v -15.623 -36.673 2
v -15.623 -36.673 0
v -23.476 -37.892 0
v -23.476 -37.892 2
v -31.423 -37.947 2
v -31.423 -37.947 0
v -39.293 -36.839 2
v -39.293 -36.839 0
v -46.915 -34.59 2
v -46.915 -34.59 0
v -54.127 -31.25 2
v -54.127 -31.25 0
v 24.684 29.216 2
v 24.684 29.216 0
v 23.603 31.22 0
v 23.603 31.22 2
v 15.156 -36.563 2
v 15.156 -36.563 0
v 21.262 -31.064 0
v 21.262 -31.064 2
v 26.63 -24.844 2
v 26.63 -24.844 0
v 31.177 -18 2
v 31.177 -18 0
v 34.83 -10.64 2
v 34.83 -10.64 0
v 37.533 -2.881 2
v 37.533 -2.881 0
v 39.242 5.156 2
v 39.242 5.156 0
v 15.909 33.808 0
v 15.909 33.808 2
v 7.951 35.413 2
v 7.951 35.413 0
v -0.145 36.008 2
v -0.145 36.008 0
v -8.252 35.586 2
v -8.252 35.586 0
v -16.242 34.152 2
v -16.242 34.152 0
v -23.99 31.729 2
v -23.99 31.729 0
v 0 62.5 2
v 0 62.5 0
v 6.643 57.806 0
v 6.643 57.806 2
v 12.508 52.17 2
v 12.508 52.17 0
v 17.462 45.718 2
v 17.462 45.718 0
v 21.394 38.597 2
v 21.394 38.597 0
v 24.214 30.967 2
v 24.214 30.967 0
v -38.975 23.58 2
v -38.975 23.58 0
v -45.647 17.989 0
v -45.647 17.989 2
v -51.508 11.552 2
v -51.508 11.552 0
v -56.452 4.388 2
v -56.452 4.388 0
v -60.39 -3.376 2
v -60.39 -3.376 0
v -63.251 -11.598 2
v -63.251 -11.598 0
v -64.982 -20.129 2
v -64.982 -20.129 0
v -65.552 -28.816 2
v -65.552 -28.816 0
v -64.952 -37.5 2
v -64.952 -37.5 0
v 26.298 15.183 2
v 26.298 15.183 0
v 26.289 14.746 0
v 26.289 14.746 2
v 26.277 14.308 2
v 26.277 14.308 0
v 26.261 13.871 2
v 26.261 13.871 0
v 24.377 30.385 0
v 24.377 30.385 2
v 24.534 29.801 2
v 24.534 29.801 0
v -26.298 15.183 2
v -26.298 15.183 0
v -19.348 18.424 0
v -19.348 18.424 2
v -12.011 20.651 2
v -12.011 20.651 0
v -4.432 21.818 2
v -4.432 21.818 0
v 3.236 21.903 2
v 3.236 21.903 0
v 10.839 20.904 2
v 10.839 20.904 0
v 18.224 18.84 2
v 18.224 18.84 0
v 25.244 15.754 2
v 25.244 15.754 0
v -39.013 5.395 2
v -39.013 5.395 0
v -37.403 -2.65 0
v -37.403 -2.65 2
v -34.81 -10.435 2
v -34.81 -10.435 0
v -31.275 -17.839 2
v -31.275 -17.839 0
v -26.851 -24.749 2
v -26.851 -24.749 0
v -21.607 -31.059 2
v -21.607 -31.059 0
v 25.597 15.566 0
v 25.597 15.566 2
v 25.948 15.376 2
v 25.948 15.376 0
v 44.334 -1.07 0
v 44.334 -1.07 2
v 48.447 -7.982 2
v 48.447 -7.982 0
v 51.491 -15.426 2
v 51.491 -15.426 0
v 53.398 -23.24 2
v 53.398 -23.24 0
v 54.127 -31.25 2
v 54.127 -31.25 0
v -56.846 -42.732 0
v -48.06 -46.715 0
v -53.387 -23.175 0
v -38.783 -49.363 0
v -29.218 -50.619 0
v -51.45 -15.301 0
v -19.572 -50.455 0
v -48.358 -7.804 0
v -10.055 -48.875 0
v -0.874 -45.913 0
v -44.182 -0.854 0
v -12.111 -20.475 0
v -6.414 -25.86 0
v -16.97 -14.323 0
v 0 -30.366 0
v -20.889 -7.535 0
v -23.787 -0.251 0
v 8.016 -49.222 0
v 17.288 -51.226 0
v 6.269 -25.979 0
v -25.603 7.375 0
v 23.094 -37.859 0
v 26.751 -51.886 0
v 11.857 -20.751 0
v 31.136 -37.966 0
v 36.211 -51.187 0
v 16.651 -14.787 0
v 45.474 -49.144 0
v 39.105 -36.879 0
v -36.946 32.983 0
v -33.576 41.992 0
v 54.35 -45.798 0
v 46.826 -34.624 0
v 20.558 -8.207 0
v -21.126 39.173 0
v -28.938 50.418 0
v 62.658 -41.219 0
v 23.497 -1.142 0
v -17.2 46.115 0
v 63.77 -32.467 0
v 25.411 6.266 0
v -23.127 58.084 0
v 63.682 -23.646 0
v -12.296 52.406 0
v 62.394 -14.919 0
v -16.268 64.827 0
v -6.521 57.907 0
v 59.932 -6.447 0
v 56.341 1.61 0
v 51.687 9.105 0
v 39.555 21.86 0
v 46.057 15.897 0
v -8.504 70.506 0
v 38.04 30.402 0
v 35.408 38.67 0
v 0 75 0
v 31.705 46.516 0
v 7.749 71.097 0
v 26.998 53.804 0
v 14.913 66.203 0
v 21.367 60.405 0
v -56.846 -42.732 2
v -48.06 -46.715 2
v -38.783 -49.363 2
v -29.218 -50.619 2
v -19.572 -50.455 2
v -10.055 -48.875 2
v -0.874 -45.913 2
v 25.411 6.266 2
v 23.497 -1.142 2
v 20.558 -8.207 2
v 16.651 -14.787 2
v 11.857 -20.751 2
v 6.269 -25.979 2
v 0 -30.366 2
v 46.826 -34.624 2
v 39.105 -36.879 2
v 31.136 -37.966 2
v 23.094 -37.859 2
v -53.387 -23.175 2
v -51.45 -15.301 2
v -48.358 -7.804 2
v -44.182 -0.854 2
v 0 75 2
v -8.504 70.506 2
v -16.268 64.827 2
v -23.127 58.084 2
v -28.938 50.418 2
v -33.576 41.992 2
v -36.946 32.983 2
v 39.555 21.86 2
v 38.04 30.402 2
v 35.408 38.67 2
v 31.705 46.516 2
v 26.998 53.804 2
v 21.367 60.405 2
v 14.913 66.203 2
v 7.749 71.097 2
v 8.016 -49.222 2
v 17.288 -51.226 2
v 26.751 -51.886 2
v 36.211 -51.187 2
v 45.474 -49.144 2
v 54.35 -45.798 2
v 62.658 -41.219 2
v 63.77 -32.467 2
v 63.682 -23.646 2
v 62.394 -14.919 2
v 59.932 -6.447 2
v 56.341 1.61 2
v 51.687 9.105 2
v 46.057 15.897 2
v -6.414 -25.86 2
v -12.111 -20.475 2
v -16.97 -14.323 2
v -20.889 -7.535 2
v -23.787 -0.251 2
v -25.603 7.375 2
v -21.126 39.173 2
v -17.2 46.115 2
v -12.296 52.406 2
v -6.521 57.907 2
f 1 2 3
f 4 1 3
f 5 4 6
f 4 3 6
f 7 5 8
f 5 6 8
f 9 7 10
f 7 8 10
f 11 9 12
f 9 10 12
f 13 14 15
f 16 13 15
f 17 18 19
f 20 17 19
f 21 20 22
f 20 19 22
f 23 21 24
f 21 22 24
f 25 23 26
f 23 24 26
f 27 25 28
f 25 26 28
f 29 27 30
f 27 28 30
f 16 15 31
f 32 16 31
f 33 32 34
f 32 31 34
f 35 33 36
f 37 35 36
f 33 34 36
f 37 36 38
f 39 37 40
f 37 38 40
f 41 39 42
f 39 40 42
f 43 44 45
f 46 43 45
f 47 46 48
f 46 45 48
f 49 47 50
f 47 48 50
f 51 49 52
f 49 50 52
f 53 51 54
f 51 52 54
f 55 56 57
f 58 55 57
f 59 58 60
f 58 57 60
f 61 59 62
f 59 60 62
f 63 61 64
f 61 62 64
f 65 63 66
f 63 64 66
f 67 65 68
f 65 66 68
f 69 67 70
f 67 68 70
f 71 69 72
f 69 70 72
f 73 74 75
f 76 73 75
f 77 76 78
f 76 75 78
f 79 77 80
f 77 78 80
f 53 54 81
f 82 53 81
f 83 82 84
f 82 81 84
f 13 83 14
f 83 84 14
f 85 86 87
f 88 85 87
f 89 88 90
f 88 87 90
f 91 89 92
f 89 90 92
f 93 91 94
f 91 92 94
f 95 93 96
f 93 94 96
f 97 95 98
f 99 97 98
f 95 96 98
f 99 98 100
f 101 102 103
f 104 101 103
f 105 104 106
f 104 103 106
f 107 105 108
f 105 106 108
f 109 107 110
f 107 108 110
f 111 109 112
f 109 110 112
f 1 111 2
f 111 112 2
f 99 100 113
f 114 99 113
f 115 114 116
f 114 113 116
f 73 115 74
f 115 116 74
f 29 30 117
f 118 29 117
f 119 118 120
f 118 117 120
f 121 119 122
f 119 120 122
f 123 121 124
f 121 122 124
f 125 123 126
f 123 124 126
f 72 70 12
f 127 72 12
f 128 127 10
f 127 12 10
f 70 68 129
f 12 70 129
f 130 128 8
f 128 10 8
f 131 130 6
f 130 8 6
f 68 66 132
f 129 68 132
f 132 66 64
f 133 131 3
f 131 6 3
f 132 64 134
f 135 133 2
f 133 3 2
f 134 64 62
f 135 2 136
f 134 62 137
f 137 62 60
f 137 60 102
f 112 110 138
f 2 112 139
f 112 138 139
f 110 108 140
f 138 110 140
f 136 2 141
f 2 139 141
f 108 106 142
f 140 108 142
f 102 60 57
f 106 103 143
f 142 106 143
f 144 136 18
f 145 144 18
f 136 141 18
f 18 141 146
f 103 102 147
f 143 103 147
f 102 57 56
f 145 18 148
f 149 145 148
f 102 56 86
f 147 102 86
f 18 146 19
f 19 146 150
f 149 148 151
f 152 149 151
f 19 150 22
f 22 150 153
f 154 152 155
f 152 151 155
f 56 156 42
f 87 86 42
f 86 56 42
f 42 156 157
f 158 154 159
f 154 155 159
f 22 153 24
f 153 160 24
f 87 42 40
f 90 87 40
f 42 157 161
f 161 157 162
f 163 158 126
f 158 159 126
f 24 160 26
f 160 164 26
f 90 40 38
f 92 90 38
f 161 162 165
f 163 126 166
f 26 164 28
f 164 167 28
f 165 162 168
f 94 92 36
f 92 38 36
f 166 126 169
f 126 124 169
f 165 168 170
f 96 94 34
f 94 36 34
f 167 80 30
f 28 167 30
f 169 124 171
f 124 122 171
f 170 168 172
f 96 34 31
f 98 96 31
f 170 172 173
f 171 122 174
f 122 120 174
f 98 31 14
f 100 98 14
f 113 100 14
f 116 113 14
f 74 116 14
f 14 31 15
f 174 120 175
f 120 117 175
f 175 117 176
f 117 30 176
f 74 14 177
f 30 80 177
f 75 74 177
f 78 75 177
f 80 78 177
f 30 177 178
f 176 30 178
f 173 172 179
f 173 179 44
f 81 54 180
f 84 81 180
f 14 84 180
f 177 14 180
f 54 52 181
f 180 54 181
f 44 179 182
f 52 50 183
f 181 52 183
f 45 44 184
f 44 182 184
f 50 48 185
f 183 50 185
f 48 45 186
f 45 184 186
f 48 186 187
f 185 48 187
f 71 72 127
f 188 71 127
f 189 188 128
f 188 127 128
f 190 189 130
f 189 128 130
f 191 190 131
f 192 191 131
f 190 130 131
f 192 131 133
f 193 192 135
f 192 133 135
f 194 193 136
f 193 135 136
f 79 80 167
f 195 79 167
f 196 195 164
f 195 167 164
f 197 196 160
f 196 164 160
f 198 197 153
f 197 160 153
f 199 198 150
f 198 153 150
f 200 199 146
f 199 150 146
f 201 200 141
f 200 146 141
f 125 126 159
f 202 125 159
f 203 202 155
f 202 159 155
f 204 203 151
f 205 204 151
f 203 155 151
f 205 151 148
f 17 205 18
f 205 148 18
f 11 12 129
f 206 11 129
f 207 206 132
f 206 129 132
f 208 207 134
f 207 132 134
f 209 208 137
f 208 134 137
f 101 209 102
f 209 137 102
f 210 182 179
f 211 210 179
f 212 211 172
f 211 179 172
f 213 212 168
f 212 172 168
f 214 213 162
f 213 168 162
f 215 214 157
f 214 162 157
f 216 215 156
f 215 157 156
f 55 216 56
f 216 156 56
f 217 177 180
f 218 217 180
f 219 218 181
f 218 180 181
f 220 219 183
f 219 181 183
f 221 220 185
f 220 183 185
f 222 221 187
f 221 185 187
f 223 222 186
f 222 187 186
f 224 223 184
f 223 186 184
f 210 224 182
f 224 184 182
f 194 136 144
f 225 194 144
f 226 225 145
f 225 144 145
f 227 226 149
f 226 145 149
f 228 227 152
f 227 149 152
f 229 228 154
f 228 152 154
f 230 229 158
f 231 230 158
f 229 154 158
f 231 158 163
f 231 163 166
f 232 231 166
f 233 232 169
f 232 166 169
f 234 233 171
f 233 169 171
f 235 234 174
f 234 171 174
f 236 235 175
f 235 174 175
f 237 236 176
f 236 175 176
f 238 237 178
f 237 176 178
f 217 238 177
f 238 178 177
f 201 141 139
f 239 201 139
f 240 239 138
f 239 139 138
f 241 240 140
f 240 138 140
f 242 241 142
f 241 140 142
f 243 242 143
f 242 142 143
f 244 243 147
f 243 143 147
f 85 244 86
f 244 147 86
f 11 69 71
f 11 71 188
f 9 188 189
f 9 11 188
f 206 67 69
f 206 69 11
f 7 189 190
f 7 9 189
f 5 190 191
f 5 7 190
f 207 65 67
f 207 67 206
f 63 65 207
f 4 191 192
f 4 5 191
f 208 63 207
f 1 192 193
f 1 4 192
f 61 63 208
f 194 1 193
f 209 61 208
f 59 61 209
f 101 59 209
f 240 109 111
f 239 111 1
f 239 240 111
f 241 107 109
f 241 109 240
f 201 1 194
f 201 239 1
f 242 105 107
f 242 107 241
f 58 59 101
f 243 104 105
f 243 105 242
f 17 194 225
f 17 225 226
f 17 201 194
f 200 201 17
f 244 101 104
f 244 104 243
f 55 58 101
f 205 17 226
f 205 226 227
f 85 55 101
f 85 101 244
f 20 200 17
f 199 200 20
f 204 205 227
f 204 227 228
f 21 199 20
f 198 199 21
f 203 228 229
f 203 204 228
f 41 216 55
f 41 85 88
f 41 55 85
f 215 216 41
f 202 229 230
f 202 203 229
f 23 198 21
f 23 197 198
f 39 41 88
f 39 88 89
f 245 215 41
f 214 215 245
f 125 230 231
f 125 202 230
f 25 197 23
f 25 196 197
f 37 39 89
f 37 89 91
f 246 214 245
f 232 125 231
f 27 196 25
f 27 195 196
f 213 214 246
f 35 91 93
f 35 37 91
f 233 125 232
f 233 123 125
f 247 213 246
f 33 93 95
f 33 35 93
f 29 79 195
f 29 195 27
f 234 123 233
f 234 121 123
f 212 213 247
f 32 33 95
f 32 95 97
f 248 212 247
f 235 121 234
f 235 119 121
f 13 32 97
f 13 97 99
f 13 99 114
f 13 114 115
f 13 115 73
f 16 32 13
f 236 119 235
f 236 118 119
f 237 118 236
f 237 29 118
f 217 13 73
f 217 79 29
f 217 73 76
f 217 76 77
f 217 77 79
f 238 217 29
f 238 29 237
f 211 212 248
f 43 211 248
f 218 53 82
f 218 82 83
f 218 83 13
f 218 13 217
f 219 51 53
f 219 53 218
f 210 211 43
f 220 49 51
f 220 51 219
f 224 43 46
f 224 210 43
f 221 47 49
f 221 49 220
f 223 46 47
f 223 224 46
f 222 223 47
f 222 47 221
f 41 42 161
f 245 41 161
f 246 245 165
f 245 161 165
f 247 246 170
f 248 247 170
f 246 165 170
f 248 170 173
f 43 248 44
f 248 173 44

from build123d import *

# Parameters (mm, degrees)
F1_DEPTH = 2


with BuildPart() as f1:
    # F0 (on Top) → F1 (new body)
    with BuildSketch(Plane.XY):
        with BuildLine():
            ThreePointArc((-38.974674, 23.580405), (-60.390278, -3.375836), (-64.951905, -37.5))
            ThreePointArc((-64.951905, -37.5), (-34.023862, -50.167524), (-0.874012, -45.913403))
            ThreePointArc((-0.874012, -45.913403), (-8.553201, -41.779684), (-15.62271, -36.672862))
            ThreePointArc((-15.62271, -36.672862), (-35.378352, -37.537867), (-54.126588, -31.25))
            ThreePointArc((-54.126588, -31.25), (-50.044813, -11.494391), (-39.013473, 5.395087))
            ThreePointArc((-39.013473, 5.395087), (-33.020374, 10.762858), (-26.297898, 15.183099))
            ThreePointArc((-26.297898, 15.183099), (-0.599358, 21.996682), (25.243749, 15.753792))
            ThreePointArc((25.243749, 15.753792), (25.772403, 15.471363), (26.297898, 15.183099))
            ThreePointArc((26.297898, 15.183099), (25.95057, 22.252358), (24.683909, 29.21588))
            Line((24.683909, 29.21588), (23.603483, 31.219872))
            ThreePointArc((23.603483, 31.219872), (-0.144813, 36.00849), (-23.990038, 31.728577))
            ThreePointArc((-23.990038, 31.728577), (-31.751976, 28.150327), (-38.974674, 23.580405))
        make_face()
        with BuildLine():
            ThreePointArc((39.555322, 21.859627), (26.997523, 53.803957), (0, 75))
            ThreePointArc((0, 75), (-26.171862, 54.356893), (-38.974674, 23.580405))
            ThreePointArc((-38.974674, 23.580405), (-31.751976, 28.150327), (-23.990038, 31.728577))
            ThreePointArc((-23.990038, 31.728577), (-14.863791, 49.350843), (0, 62.5))
            ThreePointArc((0, 62.5), (15.106633, 49.036989), (24.21408, 30.967195))
            ThreePointArc((24.21408, 30.967195), (24.456327, 30.093505), (24.683909, 29.21588))
            ThreePointArc((24.683909, 29.21588), (25.95057, 22.252358), (26.297898, 15.183099))
            ThreePointArc((26.297898, 15.183099), (26.283203, 14.526877), (26.260553, 13.870882))
            ThreePointArc((26.260553, 13.870882), (18.720926, -11.566447), (0, -30.366197))
            ThreePointArc((0, -30.366197), (7.342348, -34.040767), (15.155964, -36.562659))
            ThreePointArc((15.155964, -36.562659), (31.176915, -18), (39.242174, 5.155879))
            ThreePointArc((39.242174, 5.155879), (39.933917, 13.49772), (39.555322, 21.859627))
        make_face()
        with BuildLine():
            ThreePointArc((-0.874012, -45.913403), (31.493402, -51.705945), (62.657862, -41.218834))
            ThreePointArc((62.657862, -41.218834), (59.931979, -6.447298), (39.555322, 21.859627))
            ThreePointArc((39.555322, 21.859627), (39.933917, 13.49772), (39.242174, 5.155879))
            ThreePointArc((39.242174, 5.155879), (50.107668, -11.647461), (54.126588, -31.25))
            ThreePointArc((54.126588, -31.25), (35.140832, -37.570783), (15.155964, -36.562659))
            ThreePointArc((15.155964, -36.562659), (7.342348, -34.040767), (0, -30.366197))
            ThreePointArc((0, -30.366197), (-19.052559, -11), (-26.297898, 15.183099))
            ThreePointArc((-26.297898, 15.183099), (-33.020374, 10.762858), (-39.013473, 5.395087))
            ThreePointArc((-39.013473, 5.395087), (-31.274777, -17.838898), (-15.62271, -36.672862))
            ThreePointArc((-15.62271, -36.672862), (-8.553201, -41.779684), (-0.874012, -45.913403))
        make_face()
    extrude(amount=F1_DEPTH)


solid = f1.part
